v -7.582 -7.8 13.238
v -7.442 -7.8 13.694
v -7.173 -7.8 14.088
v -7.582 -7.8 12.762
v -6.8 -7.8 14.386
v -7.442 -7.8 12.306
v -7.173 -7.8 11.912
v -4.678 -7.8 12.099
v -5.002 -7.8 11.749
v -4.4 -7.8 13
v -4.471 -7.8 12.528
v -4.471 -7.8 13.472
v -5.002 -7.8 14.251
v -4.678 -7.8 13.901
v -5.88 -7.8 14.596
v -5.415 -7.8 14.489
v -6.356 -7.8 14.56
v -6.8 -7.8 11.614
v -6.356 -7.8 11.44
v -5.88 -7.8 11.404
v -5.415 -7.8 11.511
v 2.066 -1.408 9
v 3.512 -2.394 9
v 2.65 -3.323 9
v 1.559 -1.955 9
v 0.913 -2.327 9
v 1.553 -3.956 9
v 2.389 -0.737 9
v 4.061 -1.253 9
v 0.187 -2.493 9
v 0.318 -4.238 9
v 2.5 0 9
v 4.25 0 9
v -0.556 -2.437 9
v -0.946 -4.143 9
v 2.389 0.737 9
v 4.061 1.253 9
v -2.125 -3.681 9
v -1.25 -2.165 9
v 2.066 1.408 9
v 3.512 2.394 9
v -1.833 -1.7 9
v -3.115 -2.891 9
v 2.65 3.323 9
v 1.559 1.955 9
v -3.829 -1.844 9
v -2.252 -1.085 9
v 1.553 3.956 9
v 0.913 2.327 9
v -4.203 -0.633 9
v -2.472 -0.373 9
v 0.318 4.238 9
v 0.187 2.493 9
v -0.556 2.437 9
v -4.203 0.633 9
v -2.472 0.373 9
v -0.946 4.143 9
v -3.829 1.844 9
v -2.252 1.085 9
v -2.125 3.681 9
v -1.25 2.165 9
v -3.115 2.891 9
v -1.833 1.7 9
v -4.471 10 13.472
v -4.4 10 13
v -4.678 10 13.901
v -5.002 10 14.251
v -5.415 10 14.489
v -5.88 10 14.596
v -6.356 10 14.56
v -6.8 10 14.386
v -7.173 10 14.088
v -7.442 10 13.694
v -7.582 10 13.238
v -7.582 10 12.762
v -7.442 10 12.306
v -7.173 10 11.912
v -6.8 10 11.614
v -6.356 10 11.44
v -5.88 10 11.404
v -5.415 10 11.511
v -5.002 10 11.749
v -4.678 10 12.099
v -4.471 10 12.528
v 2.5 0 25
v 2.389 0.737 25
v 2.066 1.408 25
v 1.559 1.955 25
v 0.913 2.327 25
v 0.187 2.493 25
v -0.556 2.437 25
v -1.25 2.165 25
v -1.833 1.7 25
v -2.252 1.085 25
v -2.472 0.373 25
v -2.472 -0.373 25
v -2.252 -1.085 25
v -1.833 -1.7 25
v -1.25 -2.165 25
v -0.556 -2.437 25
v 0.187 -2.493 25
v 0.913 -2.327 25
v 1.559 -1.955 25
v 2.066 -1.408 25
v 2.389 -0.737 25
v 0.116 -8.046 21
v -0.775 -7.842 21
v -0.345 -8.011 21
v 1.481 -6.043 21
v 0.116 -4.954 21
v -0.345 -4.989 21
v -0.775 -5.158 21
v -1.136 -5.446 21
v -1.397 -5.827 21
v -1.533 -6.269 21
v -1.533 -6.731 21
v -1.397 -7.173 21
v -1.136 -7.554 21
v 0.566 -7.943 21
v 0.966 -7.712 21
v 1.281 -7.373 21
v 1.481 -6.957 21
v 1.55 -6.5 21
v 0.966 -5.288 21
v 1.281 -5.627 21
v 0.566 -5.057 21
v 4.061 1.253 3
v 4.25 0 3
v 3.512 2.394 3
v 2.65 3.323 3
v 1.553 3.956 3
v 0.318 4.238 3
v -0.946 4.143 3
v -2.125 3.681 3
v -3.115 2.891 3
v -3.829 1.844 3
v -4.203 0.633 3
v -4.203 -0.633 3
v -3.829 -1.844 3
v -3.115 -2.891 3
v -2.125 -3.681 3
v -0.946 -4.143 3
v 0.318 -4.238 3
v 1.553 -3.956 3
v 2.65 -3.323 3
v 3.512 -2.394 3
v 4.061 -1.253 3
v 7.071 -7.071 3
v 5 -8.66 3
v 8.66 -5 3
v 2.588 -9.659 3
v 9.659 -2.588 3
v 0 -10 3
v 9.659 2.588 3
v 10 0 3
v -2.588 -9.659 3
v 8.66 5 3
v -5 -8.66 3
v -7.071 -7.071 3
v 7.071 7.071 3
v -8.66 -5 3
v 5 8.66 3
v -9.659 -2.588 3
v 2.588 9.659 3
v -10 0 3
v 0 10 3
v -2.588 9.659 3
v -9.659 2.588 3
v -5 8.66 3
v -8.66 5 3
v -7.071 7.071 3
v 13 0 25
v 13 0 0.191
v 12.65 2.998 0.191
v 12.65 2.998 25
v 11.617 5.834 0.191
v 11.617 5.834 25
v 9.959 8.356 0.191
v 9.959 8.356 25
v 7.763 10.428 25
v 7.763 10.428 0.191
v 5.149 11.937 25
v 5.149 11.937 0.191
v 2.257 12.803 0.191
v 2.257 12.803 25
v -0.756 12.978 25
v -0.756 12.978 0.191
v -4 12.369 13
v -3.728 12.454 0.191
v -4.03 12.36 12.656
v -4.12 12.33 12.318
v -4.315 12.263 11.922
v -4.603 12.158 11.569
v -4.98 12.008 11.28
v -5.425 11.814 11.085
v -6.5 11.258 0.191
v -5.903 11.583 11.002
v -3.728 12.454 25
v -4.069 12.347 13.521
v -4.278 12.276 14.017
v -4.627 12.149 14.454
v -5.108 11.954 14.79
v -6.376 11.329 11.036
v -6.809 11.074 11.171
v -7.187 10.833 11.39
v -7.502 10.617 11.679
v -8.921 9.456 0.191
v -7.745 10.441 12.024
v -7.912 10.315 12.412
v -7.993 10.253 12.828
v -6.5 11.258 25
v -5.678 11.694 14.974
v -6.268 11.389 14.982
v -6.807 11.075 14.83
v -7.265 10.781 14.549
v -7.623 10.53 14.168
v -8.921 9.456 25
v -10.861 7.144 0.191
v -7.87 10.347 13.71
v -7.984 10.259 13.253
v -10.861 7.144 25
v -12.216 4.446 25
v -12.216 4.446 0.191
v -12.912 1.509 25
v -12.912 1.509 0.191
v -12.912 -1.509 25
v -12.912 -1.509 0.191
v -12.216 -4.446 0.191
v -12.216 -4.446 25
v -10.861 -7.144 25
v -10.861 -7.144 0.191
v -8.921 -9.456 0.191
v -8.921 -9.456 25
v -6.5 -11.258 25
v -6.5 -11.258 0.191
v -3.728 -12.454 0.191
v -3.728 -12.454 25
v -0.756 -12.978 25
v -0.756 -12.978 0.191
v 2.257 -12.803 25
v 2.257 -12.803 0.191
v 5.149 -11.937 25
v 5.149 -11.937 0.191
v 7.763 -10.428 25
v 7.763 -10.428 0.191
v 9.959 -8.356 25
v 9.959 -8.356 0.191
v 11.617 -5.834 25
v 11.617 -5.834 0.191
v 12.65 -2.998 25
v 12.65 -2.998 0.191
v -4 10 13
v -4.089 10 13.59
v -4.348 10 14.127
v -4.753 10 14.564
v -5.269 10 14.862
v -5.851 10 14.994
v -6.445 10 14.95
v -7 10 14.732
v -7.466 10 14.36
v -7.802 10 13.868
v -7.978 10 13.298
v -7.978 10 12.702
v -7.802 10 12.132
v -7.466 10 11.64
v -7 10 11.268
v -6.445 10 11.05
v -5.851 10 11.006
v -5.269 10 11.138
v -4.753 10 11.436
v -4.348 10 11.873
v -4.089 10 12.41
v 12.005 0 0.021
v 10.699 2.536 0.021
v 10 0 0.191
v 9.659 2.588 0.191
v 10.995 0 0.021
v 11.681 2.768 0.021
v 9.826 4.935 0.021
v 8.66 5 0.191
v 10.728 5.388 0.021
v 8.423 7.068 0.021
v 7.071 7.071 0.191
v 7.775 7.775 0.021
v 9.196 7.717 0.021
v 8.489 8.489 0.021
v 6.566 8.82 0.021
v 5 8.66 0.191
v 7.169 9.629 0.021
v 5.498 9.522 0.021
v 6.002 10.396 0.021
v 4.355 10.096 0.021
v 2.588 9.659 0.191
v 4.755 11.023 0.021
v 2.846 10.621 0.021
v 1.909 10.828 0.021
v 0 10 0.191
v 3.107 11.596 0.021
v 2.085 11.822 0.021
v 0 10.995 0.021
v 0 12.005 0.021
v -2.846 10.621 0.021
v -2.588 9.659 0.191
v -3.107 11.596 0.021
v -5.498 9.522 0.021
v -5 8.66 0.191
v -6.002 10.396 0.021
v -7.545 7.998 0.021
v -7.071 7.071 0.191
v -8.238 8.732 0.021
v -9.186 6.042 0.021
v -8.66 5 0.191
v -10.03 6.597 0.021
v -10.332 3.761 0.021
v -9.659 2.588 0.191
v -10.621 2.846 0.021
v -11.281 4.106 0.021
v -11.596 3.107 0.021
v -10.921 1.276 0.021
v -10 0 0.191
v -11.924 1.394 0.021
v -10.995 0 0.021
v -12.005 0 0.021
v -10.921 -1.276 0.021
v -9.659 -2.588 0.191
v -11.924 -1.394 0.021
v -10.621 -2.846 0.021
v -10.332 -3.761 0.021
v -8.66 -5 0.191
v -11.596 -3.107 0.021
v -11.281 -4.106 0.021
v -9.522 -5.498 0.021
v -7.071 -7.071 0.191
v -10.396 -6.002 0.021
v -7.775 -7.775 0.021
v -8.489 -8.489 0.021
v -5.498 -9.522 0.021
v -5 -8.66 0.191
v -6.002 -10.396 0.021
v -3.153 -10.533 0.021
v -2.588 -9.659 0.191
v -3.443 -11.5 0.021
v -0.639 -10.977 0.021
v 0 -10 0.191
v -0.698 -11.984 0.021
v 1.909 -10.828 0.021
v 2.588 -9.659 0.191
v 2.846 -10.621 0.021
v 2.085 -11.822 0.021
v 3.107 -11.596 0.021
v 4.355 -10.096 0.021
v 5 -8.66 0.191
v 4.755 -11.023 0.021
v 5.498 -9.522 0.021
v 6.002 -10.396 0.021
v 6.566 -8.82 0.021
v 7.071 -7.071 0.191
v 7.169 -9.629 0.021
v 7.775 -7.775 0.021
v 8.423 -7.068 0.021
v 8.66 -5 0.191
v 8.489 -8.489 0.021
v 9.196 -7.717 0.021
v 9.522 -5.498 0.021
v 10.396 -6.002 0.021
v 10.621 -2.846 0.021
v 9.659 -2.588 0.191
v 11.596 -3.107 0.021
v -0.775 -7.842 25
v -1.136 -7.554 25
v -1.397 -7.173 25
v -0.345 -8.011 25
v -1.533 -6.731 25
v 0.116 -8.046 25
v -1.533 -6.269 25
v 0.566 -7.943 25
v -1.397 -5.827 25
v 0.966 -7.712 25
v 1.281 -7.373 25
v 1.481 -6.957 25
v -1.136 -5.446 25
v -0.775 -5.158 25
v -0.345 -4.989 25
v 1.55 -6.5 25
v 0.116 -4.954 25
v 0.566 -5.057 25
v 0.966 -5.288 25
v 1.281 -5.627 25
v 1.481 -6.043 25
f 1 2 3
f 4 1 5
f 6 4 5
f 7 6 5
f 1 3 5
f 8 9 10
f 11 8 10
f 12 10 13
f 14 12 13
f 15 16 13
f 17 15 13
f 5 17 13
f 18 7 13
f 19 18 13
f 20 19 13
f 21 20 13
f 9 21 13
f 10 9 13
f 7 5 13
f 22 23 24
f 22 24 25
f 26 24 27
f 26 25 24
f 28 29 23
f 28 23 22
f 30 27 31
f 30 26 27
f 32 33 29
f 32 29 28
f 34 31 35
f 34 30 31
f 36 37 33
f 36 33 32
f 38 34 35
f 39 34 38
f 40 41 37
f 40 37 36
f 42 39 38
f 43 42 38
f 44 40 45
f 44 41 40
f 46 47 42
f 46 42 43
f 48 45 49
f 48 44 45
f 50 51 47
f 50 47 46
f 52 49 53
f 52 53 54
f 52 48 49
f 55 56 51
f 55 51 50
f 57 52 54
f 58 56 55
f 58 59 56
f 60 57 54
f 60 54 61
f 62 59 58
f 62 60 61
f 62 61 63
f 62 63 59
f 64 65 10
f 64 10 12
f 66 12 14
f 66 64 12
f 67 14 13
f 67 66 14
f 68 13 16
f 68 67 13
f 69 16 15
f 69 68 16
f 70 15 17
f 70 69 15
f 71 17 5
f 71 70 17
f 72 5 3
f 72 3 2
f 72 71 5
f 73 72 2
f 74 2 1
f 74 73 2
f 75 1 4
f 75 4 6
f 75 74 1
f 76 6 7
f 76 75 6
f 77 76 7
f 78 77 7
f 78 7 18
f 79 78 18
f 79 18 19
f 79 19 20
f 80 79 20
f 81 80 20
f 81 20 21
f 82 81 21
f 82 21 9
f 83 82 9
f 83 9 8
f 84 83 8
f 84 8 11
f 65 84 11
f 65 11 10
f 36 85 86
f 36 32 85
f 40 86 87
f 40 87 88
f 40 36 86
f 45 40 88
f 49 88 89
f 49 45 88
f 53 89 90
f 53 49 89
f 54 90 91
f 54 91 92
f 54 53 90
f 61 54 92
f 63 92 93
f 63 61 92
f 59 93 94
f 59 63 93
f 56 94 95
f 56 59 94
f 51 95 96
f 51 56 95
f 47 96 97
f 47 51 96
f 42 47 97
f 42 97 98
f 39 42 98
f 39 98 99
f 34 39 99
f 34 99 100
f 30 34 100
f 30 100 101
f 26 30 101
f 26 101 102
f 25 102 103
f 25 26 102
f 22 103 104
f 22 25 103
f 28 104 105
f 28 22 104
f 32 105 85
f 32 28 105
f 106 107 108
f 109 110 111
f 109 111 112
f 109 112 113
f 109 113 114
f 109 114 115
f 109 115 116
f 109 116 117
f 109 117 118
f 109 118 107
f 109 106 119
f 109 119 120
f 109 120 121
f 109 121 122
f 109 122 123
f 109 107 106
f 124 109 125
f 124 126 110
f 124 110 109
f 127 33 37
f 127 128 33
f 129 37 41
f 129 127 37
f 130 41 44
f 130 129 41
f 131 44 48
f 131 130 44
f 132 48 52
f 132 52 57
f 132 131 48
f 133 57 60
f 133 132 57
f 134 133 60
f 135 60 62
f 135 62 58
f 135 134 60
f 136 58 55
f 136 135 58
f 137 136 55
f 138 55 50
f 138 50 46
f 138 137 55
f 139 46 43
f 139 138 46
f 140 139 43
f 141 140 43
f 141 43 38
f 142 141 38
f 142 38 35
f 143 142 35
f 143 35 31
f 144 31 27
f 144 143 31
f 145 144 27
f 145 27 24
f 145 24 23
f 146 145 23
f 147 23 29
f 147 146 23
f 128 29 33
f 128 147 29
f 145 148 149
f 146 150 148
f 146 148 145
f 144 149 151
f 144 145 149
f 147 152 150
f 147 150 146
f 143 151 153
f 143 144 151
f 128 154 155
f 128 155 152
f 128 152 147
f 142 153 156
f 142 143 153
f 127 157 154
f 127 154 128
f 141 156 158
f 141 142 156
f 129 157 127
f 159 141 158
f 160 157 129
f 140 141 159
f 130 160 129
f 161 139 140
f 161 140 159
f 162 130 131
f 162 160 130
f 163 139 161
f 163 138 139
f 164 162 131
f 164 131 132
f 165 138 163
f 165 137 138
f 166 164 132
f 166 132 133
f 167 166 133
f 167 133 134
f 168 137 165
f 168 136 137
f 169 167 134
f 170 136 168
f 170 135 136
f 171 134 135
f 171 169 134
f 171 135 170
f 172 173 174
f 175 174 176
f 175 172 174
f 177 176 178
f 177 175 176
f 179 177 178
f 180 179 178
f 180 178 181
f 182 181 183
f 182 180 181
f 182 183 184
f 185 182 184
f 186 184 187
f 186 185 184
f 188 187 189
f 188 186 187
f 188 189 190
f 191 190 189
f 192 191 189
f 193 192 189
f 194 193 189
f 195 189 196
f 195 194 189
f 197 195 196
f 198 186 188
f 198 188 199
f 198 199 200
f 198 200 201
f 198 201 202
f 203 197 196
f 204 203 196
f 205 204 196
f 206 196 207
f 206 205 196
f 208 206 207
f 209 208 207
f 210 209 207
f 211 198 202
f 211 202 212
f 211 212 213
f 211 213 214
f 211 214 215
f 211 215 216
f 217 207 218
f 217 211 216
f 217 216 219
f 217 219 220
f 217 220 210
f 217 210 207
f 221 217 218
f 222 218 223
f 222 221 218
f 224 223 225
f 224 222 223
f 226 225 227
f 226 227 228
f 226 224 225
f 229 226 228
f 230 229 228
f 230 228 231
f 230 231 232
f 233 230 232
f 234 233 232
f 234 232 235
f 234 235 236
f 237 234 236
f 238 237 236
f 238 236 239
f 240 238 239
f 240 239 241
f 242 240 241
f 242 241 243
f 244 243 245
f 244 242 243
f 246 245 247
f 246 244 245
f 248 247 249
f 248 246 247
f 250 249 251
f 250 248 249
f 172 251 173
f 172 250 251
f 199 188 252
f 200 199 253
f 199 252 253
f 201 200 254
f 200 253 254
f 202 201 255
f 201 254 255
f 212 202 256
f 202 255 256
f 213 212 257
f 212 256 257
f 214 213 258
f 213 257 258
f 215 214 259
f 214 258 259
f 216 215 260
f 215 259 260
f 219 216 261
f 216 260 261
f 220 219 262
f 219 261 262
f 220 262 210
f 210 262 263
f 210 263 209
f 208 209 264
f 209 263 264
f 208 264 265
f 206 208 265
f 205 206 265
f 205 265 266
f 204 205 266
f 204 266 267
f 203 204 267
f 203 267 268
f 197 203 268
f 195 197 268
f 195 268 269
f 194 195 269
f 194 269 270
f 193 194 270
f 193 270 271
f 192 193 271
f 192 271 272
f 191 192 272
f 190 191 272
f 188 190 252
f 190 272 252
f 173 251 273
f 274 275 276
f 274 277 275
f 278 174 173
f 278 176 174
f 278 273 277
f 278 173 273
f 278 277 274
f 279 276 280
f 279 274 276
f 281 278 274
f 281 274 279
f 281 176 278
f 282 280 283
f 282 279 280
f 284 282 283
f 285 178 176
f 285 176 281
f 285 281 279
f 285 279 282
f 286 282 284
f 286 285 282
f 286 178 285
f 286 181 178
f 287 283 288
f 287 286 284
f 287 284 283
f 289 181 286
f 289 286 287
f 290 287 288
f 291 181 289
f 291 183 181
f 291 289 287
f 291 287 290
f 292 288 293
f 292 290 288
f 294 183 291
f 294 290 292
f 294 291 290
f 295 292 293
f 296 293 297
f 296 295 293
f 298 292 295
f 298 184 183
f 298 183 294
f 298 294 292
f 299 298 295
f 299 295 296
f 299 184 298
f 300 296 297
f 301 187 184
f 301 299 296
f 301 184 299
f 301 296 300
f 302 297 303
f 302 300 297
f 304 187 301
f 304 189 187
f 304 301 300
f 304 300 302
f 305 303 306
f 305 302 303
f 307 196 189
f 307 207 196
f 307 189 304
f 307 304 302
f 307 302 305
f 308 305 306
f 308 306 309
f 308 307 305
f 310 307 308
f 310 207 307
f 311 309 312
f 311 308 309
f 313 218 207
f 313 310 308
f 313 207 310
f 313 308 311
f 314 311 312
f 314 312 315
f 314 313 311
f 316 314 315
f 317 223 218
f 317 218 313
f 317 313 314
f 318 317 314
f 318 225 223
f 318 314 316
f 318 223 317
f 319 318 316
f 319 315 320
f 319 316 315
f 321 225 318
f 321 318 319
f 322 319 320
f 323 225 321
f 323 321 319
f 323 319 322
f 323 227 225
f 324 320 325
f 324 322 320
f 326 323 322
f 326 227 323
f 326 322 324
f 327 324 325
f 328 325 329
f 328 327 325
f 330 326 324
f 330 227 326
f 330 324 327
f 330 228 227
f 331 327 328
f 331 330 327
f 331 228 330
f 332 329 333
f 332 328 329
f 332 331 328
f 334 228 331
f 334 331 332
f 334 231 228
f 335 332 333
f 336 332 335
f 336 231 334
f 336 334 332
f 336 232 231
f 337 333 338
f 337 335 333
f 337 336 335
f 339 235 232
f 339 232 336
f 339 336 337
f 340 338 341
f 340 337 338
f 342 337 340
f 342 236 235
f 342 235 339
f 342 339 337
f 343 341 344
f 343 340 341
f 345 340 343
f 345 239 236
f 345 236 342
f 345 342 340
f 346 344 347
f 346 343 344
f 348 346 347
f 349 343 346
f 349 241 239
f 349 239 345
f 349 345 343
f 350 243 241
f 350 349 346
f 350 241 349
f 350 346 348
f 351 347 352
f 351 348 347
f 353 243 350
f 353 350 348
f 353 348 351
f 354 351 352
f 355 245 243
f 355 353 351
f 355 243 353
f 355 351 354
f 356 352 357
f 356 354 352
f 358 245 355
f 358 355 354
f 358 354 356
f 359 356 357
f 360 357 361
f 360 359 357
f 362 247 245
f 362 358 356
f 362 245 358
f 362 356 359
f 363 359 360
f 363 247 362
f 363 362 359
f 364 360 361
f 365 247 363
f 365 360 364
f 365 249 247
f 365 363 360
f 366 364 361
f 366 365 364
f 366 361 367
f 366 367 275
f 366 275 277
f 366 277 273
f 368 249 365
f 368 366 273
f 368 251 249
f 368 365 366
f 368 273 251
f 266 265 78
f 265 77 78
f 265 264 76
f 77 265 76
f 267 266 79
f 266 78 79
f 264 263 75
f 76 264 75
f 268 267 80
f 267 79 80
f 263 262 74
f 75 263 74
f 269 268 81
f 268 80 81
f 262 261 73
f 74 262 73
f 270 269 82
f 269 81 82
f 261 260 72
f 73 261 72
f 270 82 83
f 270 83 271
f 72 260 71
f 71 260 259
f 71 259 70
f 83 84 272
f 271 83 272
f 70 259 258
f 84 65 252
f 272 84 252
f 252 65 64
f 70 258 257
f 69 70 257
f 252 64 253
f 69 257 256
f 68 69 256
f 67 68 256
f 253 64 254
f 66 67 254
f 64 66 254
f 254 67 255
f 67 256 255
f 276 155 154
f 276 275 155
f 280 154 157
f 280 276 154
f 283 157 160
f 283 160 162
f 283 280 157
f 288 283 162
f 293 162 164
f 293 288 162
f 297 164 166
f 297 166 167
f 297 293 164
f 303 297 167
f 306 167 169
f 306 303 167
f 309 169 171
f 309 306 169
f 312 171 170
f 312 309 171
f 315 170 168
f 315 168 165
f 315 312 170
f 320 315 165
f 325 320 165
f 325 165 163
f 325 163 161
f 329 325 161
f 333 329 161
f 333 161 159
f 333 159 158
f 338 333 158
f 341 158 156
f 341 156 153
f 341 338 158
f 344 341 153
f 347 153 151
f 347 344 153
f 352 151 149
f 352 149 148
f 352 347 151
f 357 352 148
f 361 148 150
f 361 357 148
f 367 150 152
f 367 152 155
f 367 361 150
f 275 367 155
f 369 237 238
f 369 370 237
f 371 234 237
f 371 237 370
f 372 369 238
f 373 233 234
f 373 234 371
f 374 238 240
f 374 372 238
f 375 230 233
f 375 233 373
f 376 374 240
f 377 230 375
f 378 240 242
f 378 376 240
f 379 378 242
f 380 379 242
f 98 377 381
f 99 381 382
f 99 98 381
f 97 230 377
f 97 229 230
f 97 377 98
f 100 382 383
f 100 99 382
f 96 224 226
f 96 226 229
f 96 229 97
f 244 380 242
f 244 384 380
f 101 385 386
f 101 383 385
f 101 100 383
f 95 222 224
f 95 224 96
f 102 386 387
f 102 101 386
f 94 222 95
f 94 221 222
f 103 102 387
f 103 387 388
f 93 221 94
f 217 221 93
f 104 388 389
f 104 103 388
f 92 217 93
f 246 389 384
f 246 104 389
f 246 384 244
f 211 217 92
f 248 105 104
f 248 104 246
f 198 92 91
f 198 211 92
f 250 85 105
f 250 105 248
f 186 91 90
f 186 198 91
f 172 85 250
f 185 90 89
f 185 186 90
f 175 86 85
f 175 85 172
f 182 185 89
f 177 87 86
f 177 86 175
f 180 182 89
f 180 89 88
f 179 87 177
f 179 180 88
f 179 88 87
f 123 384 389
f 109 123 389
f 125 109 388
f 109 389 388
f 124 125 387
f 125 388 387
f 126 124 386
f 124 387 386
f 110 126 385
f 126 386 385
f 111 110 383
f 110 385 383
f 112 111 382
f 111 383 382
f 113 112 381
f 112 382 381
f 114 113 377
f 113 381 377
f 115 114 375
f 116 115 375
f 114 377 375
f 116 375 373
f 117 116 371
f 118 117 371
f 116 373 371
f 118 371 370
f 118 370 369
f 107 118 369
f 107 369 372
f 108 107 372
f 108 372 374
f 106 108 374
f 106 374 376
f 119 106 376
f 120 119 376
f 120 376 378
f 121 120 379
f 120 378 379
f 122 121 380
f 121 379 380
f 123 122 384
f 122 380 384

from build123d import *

# Parameters (mm, degrees)
F4_R      = 1.55
F5_DEPTH  = 4
F7_R      = 1.6
F8_DEPTH  = 20.8
F10_R     = 2
F11_DEPTH = 3


with BuildPart() as f1:
    # F0 (on Front) → F1 (revolve)
    with BuildSketch(Plane.XZ):
        with BuildLine():
            Line((10, 3), (10, 0.190525))
            ThreePointArc((10, 0.190525), (11.5, 0), (13, 0.190525))
            Line((13, 0.190525), (13, 25))
            Line((13, 25), (2.5, 25))
            Line((2.5, 25), (2.5, 9))
            Line((2.5, 9), (4.25, 9))
            Line((4.25, 9), (4.25, 3))
            Line((4.25, 3), (10, 3))
        make_face()
    revolve(axis=Axis((0, 0, 12.5), (0, 0, 1)))

    # F4 (on offset) → F5 (cut)
    with BuildSketch(Plane.XY.offset(25)):
        with Locations((0, -6.5)):
            Circle(F4_R)
    extrude(amount=-F5_DEPTH, mode=Mode.SUBTRACT)

    # F7 (on offset) → F8 (cut)
    with BuildSketch(Plane.XZ.offset(-13)):
        with Locations((-6, 13)):
            Circle(F7_R)
    extrude(amount=F8_DEPTH, mode=Mode.SUBTRACT)

    # F10 (on offset) → F11 (cut)
    with BuildSketch(Plane.XZ.offset(-10)):
        with Locations((-6, 13)):
            Circle(F10_R)
    extrude(amount=-F11_DEPTH, mode=Mode.SUBTRACT)


solid = f1.part
